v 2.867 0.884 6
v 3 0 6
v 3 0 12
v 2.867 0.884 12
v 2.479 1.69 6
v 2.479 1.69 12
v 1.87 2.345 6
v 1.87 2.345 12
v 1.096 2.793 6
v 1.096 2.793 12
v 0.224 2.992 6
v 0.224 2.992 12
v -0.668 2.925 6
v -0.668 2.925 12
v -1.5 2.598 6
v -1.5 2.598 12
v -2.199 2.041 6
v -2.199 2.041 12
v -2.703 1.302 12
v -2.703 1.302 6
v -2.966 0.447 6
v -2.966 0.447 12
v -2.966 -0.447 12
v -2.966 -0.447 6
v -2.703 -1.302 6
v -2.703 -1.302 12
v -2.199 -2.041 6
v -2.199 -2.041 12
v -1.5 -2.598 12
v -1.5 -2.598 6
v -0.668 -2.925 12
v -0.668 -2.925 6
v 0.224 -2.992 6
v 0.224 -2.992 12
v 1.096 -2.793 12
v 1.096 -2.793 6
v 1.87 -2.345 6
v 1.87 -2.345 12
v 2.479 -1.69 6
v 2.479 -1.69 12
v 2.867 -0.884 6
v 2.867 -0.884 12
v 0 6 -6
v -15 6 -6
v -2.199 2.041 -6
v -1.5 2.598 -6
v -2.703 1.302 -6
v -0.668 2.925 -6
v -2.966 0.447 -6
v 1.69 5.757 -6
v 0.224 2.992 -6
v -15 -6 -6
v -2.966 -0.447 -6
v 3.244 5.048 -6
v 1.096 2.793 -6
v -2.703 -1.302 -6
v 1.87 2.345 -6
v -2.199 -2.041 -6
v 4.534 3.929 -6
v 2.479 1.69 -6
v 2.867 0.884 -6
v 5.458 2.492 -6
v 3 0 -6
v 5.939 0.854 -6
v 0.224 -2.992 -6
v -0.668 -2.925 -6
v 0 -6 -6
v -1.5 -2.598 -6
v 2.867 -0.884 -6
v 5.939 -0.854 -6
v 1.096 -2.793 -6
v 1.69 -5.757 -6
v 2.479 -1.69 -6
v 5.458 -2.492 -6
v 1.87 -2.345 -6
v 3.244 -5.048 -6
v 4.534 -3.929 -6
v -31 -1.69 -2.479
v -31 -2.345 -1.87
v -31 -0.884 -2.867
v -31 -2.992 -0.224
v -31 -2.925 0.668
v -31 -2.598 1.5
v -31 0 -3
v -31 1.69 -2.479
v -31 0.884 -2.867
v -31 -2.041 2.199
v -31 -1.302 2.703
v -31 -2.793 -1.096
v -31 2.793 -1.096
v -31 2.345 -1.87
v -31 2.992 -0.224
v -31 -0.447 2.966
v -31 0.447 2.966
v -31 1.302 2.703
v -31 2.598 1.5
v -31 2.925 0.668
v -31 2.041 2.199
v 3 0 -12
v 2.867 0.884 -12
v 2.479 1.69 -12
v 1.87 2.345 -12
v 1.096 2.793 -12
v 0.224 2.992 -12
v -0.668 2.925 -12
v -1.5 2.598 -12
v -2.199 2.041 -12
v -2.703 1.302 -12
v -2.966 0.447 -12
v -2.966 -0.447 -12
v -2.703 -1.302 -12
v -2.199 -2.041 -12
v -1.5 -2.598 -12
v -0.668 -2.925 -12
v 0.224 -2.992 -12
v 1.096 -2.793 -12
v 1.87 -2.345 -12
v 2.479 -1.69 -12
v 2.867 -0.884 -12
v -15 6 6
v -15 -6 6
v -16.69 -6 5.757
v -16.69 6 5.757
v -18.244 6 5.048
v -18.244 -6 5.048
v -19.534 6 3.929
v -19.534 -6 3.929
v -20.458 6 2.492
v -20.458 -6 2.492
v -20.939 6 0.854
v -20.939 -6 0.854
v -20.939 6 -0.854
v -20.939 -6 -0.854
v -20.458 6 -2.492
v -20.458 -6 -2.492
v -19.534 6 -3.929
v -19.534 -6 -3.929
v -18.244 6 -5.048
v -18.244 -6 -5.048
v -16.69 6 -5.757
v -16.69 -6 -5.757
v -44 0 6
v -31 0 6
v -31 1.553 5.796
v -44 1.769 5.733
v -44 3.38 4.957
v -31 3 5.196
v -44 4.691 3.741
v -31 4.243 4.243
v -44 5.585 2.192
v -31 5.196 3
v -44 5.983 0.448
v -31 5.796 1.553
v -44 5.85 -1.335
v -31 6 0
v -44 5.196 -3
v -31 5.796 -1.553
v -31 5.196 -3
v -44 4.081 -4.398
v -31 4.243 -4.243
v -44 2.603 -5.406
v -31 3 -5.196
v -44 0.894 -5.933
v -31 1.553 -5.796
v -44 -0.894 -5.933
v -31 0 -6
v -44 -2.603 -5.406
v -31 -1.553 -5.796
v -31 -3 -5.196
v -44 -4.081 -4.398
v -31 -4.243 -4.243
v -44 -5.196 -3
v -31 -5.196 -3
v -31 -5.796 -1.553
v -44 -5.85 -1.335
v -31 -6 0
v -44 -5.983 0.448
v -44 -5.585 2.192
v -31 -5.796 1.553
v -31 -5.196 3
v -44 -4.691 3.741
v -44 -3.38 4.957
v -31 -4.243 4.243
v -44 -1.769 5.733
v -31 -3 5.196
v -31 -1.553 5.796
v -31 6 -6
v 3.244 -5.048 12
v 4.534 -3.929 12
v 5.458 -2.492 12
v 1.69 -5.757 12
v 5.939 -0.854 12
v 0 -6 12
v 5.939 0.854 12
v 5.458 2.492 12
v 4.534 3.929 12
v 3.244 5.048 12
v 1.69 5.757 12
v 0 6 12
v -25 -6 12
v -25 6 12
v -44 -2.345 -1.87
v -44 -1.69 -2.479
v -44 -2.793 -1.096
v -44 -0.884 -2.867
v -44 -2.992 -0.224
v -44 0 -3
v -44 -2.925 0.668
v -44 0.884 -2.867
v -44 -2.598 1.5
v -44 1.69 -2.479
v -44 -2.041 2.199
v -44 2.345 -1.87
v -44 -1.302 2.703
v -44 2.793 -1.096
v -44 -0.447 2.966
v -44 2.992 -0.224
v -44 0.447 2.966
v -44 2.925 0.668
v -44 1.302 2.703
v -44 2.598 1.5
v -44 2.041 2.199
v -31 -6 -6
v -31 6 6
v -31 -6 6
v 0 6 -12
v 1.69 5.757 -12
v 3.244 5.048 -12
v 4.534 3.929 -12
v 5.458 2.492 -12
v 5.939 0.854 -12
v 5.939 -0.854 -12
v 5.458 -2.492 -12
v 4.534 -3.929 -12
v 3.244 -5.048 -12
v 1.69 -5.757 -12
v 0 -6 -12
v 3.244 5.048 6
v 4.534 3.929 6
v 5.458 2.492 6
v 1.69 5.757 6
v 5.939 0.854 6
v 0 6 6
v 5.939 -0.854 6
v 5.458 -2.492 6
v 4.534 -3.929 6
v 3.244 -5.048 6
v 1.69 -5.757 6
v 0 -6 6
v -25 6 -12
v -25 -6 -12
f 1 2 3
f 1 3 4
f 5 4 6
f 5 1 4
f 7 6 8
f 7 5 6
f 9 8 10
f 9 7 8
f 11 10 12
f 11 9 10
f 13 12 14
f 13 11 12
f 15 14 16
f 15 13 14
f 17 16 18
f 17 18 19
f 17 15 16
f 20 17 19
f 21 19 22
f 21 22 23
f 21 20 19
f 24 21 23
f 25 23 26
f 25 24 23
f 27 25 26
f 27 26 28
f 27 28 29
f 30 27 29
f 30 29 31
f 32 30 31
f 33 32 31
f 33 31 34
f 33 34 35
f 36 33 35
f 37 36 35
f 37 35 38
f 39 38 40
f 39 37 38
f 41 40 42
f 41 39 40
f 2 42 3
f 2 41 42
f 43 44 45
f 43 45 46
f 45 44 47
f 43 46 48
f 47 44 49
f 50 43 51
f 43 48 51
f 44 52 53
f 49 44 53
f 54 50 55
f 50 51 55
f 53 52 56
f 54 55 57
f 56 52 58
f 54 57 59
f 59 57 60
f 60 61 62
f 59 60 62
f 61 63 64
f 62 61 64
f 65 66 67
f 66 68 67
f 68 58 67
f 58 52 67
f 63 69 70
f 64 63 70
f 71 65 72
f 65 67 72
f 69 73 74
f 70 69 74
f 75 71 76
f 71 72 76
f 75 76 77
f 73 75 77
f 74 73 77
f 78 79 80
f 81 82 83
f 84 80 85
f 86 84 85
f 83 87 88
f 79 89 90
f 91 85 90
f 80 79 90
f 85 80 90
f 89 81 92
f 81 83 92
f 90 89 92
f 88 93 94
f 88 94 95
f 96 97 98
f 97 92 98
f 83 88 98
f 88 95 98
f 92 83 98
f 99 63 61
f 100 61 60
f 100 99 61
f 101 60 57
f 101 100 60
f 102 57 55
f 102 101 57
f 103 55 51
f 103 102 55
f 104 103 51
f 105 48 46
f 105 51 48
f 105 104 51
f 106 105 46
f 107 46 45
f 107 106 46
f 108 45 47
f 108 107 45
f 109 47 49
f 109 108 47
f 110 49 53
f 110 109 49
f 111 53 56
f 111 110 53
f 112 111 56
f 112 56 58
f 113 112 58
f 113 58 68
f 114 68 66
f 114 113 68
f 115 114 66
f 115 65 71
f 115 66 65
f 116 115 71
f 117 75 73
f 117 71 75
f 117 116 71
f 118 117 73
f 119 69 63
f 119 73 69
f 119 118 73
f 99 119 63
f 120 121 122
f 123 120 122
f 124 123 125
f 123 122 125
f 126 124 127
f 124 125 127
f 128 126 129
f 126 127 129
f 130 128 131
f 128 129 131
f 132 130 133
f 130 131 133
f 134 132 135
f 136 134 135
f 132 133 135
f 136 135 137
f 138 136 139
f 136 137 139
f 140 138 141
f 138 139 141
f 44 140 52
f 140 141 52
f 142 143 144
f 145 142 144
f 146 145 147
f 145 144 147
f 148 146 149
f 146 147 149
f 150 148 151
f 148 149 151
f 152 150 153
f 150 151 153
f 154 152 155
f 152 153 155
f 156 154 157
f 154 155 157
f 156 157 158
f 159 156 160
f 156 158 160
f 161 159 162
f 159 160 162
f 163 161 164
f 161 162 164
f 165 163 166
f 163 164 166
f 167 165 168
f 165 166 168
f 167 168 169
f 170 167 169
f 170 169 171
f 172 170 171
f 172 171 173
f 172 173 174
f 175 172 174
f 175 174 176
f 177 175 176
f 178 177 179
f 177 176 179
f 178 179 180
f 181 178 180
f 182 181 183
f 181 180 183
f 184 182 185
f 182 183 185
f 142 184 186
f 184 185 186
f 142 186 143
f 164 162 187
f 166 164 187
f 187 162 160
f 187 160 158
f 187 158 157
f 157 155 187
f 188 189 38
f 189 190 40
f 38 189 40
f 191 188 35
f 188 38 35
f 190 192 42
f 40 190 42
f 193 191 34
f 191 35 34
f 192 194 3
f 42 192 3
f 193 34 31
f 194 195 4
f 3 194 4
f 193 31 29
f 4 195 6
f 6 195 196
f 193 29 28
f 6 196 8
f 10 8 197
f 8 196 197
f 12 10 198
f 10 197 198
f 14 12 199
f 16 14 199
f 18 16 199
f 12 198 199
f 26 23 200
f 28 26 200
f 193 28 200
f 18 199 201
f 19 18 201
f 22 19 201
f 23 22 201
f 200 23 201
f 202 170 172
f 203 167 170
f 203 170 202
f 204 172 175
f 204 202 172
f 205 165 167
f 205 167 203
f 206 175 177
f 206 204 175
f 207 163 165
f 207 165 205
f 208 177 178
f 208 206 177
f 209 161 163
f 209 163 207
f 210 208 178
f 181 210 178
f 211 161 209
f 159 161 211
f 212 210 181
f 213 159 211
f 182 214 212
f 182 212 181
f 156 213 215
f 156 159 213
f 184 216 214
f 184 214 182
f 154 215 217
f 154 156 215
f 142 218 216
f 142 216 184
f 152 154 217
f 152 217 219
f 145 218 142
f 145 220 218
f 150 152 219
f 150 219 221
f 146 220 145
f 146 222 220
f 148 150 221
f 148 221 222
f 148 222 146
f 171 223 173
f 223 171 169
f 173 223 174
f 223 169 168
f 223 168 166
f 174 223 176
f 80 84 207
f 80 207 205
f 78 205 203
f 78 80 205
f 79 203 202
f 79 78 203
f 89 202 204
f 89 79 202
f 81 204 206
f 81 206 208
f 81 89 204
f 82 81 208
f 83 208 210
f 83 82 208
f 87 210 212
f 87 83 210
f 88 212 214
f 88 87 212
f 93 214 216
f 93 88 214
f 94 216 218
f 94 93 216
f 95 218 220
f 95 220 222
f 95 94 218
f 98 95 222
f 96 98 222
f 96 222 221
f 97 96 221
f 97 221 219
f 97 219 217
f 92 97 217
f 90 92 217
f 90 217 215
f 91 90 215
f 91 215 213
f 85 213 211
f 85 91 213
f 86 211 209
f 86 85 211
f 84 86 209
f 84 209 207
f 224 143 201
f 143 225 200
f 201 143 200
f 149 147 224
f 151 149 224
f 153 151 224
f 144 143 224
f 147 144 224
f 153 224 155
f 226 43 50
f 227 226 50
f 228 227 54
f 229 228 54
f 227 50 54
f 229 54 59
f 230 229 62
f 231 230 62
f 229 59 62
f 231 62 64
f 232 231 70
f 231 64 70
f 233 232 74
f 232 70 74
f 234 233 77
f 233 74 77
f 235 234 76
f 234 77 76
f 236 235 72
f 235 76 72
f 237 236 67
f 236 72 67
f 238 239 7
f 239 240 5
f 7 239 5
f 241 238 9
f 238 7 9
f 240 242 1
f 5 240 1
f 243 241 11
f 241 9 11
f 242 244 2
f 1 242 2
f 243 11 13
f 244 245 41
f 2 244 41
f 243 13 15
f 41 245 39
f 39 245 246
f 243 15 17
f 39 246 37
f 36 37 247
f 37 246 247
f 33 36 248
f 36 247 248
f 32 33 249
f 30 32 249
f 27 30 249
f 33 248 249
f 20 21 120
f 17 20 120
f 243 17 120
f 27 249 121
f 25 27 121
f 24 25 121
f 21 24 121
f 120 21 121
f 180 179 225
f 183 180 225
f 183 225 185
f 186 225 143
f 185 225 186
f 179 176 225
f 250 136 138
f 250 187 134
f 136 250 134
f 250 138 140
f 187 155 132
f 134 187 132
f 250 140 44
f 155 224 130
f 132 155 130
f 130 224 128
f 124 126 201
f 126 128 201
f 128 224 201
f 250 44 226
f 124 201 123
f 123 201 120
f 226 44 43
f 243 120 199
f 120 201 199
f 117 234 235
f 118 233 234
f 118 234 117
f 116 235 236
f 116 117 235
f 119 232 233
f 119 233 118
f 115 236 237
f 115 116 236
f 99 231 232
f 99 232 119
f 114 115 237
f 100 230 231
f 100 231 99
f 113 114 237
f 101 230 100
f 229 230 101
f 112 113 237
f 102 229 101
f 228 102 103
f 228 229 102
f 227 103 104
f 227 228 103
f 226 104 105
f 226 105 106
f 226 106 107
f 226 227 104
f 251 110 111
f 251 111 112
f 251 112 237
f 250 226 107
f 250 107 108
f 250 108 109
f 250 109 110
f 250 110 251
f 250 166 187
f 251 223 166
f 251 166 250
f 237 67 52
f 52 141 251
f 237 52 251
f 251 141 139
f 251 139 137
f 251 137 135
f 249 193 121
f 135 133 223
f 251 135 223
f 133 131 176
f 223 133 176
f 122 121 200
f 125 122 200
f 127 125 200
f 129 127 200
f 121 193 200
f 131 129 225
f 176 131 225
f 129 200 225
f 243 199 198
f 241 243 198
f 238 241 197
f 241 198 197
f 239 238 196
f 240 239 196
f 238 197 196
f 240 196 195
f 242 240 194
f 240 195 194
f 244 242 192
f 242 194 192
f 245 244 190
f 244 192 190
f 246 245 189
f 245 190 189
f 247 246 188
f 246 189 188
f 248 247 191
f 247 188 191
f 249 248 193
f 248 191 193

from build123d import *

# Parameters (mm, degrees)
SKETCH1_R               = 3
BOSS_EXTRUDE1_DEPTH     = 12
CUT_EXTRUDE1_DEPTH      = 34.778691508
CUT_EXTRUDE1_DEPTH_BACK = 34.778691508
SKETCH3_R               = 6
SKETCH3_R_2             = 3
BOSS_EXTRUDE2_DEPTH     = 13


with BuildPart() as part:
    # Sketch1 → Boss-Extrude1 (new, symmetric)
    with BuildSketch(Plane.XY):
        with BuildLine():
            Line((0, -6), (-31, -6))
            Line((-31, -6), (-31, 6))
            Line((-31, 6), (0, 6))
            ThreePointArc((0, 6), (6, 0), (0, -6))
        make_face()
        Circle(SKETCH1_R, mode=Mode.SUBTRACT)
    extrude(amount=BOSS_EXTRUDE1_DEPTH, both=True)

    # Sketch2 → Cut-Extrude1 (cut, two sides: drawn at the far end of the back side and taken through both)
    with BuildSketch(Plane(origin=(0, 0, 0), x_dir=(1, 0, 0), z_dir=(0, 1, 0)).offset(-CUT_EXTRUDE1_DEPTH_BACK)):
        with BuildLine():
            Line((-15, 6), (6, 6))
            Line((6, 6), (6, -6))
            Line((6, -6), (-15, -6))
            ThreePointArc((-15, -6), (-21, 0), (-15, 6))
        make_face()
        Polygon((-31, 6), (-25, 12), (-31, 12), align=None)
        Polygon((-31, -12), (-31, -6), (-25, -12), align=None)
    extrude(amount=CUT_EXTRUDE1_DEPTH + CUT_EXTRUDE1_DEPTH_BACK, mode=Mode.SUBTRACT)

    # Sketch3 → Boss-Extrude2 (add)
    with BuildSketch(Plane.ZY.offset(31)):
        Circle(SKETCH3_R)
        with Locations(Location((0, 0, 0), (0, 0, 180))):
            Circle(SKETCH3_R_2, mode=Mode.SUBTRACT)
    extrude(amount=BOSS_EXTRUDE2_DEPTH)


solid = part.part
